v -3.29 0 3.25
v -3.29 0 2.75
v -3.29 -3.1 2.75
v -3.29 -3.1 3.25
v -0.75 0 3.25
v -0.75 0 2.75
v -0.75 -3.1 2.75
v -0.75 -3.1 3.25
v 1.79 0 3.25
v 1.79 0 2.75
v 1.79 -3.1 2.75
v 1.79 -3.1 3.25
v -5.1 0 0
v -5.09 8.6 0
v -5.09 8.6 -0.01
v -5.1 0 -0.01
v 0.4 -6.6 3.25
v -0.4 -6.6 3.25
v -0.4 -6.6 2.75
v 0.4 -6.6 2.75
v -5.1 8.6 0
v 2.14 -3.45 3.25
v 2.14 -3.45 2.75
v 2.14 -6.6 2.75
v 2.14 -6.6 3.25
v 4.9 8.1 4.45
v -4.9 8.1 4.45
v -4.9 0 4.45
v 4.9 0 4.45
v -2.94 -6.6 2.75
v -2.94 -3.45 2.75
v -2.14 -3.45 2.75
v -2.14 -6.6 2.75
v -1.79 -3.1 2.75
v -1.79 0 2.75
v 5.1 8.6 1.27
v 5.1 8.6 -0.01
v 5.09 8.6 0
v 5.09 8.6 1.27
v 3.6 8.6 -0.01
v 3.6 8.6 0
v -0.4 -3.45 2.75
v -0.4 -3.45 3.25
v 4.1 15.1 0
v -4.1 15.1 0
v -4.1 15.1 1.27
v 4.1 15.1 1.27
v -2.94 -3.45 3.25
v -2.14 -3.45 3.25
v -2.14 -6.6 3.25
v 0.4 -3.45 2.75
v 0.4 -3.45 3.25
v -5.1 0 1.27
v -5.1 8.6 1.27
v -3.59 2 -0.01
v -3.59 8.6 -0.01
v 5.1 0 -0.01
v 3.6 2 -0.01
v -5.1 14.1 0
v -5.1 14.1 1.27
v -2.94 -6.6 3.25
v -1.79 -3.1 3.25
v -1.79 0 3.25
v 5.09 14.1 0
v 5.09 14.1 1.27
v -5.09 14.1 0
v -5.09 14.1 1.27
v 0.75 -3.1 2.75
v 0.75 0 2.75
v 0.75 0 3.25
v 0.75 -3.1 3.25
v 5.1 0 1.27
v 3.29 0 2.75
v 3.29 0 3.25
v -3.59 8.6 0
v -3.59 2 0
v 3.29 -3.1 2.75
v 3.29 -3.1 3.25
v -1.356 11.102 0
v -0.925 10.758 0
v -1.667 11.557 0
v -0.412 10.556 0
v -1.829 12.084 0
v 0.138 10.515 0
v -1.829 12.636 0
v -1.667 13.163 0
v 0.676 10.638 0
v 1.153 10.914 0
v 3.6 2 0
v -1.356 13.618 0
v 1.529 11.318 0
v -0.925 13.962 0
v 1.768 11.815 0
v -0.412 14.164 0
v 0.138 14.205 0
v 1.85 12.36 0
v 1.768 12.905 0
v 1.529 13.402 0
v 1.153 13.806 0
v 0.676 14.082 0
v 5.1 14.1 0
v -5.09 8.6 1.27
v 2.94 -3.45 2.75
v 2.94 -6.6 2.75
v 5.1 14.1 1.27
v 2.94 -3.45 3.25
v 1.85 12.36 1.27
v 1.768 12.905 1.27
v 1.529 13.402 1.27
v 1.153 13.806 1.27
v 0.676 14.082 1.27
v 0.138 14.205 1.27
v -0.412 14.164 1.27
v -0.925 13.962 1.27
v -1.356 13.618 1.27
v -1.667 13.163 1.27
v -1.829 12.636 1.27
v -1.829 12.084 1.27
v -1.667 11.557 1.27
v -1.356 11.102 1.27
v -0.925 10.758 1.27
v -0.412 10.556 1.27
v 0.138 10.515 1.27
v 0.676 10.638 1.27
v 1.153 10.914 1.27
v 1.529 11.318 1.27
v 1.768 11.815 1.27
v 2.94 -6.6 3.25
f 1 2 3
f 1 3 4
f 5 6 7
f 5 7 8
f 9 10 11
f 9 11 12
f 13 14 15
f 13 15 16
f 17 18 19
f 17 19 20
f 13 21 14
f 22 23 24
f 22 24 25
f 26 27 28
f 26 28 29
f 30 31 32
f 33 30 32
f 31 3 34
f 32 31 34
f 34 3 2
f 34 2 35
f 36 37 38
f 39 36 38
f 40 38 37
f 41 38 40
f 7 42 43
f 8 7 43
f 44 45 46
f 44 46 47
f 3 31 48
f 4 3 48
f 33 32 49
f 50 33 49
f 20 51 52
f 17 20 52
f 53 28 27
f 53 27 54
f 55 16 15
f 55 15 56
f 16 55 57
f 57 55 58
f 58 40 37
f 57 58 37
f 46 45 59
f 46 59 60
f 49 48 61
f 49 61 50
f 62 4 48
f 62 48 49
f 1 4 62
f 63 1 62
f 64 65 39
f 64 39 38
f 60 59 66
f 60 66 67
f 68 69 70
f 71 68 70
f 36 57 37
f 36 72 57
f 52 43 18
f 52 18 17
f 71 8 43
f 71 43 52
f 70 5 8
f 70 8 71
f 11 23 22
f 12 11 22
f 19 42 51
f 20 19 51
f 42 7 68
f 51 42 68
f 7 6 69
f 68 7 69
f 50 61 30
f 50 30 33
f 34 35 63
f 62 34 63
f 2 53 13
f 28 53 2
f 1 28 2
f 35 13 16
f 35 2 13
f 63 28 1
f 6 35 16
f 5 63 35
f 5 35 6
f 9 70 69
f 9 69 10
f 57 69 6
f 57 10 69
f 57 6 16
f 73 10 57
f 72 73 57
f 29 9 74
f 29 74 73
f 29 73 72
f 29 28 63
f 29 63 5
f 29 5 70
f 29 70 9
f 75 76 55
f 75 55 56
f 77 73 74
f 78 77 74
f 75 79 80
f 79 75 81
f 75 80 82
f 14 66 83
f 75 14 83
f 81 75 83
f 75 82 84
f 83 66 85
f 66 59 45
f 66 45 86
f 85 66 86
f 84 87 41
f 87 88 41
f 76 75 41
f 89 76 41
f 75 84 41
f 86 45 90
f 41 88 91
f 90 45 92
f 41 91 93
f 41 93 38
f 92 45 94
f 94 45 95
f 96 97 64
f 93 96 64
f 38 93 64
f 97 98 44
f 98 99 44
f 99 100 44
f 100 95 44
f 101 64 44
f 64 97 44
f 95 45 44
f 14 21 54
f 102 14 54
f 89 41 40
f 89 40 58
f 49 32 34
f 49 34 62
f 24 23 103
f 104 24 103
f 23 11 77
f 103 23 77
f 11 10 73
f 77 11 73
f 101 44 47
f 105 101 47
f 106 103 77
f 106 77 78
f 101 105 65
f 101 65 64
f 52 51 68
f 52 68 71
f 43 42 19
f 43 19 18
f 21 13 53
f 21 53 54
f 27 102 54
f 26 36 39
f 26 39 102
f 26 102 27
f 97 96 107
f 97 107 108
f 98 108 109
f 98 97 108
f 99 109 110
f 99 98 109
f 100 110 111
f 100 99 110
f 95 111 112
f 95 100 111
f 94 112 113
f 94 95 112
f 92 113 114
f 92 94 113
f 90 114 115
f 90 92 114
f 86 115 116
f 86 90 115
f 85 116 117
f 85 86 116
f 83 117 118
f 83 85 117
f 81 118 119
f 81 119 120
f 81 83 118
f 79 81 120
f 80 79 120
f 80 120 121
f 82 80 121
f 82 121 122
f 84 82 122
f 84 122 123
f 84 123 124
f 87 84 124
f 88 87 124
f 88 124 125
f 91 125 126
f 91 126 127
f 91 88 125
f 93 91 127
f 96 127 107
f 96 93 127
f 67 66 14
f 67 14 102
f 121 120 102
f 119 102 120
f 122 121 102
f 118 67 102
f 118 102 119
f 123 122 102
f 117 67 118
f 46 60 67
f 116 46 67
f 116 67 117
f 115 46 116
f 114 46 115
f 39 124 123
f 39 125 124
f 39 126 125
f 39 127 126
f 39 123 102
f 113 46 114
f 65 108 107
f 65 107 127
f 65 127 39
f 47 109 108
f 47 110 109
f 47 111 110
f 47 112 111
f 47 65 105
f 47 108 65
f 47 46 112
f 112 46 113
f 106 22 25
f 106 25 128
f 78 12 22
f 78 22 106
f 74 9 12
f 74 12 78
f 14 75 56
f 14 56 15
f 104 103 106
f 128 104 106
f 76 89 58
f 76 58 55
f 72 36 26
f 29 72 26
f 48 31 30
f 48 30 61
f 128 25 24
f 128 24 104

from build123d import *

# Parameters (mm, degrees)
ESQUISSE1_W             = 10.2
ESQUISSE1_H             = 15.1
ESQUISSE1_R             = 1.85
BOSS_EXTRU_1_DEPTH      = 1.27
ESQUISSE2_W             = 10.2
ESQUISSE2_H             = 8.6
BOSS_EXTRU_2_DEPTH      = 3.18
ENL_V_MAT_EXTRU_1_DEPTH = 11.944062317
ENL_V_MAT_EXTRU_2_DEPTH = 19.757731739
ESQUISSE5_W             = 1.5
ESQUISSE5_H             = 0.5
BOSS_EXTRU_3_DEPTH      = 3.1
ESQUISSE6_W             = 0.8
ESQUISSE6_H             = 0.5
BOSS_EXTRU_4_DEPTH      = 3.5
CHANFREIN1_SIZE         = 0.35
CHANFREIN2_SIZE         = 1
ESQUISSE8_W             = 1.27
ESQUISSE8_H             = 5.5
ENL_V_MAT_EXTRU_4_DEPTH = 0.01
ESQUISSE9_W             = 1.27
ESQUISSE9_H             = 5.5
ENL_V_MAT_EXTRU_5_DEPTH = 0.01
BOSS_EXTRU_6_DEPTH      = 0.01


with BuildPart() as part:
    # Esquisse1 → Boss.-Extru.1 (new body)
    with BuildSketch(Plane.XY):
        with Locations((0, 7.55)):
            Rectangle(ESQUISSE1_W, ESQUISSE1_H)
        with Locations((0, 12.36)):
            Circle(ESQUISSE1_R, mode=Mode.SUBTRACT)
    extrude(amount=BOSS_EXTRU_1_DEPTH)

    # Esquisse2 → Boss.-Extru.2 (add)
    with BuildSketch(Plane.XY.offset(1.27)):
        with Locations((0, 4.3)):
            Rectangle(ESQUISSE2_W, ESQUISSE2_H)
    extrude(amount=BOSS_EXTRU_2_DEPTH)

    # Esquisse3 → Enlèv. mat.-Extru.1 (cut, through all)
    with BuildSketch(Plane(origin=(0, 8.6, 0), x_dir=(1, 0, 0), z_dir=(0, 1, 0))):
        Polygon((5.1, -1.27), (4.9, -4.45), (5.1, -4.45), align=None)
        Polygon((-5.1, -1.27), (-5.1, -4.45), (-4.9, -4.45), align=None)
    extrude(amount=-ENL_V_MAT_EXTRU_1_DEPTH, mode=Mode.SUBTRACT)

    # Esquisse4 → Enlèv. mat.-Extru.2 (cut, through all)
    with BuildSketch(Plane(origin=(5.1, 0, 0), x_dir=(0, 0, -1), z_dir=(1, 0, 0))):
        Polygon((-1.27, 8.6), (-4.45, 8.1), (-4.45, 8.6), align=None)
    extrude(amount=-ENL_V_MAT_EXTRU_2_DEPTH, mode=Mode.SUBTRACT)

    # Esquisse5 → Boss.-Extru.3 (add)
    with BuildSketch(Plane.XZ):
        with Locations((0, 3)):
            Rectangle(ESQUISSE5_W, ESQUISSE5_H)
        with Locations((2.54, 3)):
            Rectangle(ESQUISSE5_W, ESQUISSE5_H)
        with Locations((-2.54, 3)):
            Rectangle(ESQUISSE5_W, ESQUISSE5_H)
    extrude(amount=BOSS_EXTRU_3_DEPTH)

    # Esquisse6 → Boss.-Extru.4 (add)
    with BuildSketch(Plane.XZ.offset(3.1)):
        with Locations((-2.54, 3)):
            Rectangle(ESQUISSE6_W, ESQUISSE6_H)
        with Locations((0, 3)):
            Rectangle(ESQUISSE6_W, ESQUISSE6_H)
        with Locations((2.54, 3)):
            Rectangle(ESQUISSE6_W, ESQUISSE6_H)
    extrude(amount=BOSS_EXTRU_4_DEPTH)

    # Chanfrein1
    chanfrein1_edges = [part.edges().sort_by_distance(p)[0] for p in [
        (2.94, -3.1, 3),
        (0.4, -3.1, 3),
        (-2.14, -3.1, 3),
        (2.14, -3.1, 3),
        (-0.4, -3.1, 3),
        (-2.94, -3.1, 3),
    ]]
    chamfer(chanfrein1_edges, length=CHANFREIN1_SIZE - 0.0001)  # a hair under: the kernel refuses the full size

    # Chanfrein2
    chanfrein2_edges = [part.edges().sort_by_distance(p)[0] for p in [
        (-5.1, 15.1, 0.635),
        (5.1, 15.1, 0.635),
    ]]
    chamfer(chanfrein2_edges, length=CHANFREIN2_SIZE)

    # Esquisse8 → Enlèv. mat.-Extru.4 (cut)
    with BuildSketch(Plane(origin=(5.1, 0, 0), x_dir=(0, 0, -1), z_dir=(1, 0, 0))):
        with Locations((-0.635, 11.35)):
            Rectangle(ESQUISSE8_W, ESQUISSE8_H)
    extrude(amount=-ENL_V_MAT_EXTRU_4_DEPTH, mode=Mode.SUBTRACT)

    # Esquisse9 → Enlèv. mat.-Extru.5 (cut)
    with BuildSketch(Plane.ZY.offset(5.1)):
        with Locations((0.635, 11.35)):
            Rectangle(ESQUISSE9_W, ESQUISSE9_H)
    extrude(amount=-ENL_V_MAT_EXTRU_5_DEPTH, mode=Mode.SUBTRACT)

    # Esquisse11 → Boss.-Extru.6 (add)
    with BuildSketch(Plane(origin=(0, 0, 0), x_dir=(-1, 0, 0), z_dir=(0, 0, -1))):
        Polygon((-5.1, 0), (-5.1, 8.6), (-3.6, 8.6), (-3.6, 2), (3.59, 2), (3.59, 8.6), (5.09, 8.6), (5.1, 0), align=None)
    extrude(amount=BOSS_EXTRU_6_DEPTH)


solid = part.part
